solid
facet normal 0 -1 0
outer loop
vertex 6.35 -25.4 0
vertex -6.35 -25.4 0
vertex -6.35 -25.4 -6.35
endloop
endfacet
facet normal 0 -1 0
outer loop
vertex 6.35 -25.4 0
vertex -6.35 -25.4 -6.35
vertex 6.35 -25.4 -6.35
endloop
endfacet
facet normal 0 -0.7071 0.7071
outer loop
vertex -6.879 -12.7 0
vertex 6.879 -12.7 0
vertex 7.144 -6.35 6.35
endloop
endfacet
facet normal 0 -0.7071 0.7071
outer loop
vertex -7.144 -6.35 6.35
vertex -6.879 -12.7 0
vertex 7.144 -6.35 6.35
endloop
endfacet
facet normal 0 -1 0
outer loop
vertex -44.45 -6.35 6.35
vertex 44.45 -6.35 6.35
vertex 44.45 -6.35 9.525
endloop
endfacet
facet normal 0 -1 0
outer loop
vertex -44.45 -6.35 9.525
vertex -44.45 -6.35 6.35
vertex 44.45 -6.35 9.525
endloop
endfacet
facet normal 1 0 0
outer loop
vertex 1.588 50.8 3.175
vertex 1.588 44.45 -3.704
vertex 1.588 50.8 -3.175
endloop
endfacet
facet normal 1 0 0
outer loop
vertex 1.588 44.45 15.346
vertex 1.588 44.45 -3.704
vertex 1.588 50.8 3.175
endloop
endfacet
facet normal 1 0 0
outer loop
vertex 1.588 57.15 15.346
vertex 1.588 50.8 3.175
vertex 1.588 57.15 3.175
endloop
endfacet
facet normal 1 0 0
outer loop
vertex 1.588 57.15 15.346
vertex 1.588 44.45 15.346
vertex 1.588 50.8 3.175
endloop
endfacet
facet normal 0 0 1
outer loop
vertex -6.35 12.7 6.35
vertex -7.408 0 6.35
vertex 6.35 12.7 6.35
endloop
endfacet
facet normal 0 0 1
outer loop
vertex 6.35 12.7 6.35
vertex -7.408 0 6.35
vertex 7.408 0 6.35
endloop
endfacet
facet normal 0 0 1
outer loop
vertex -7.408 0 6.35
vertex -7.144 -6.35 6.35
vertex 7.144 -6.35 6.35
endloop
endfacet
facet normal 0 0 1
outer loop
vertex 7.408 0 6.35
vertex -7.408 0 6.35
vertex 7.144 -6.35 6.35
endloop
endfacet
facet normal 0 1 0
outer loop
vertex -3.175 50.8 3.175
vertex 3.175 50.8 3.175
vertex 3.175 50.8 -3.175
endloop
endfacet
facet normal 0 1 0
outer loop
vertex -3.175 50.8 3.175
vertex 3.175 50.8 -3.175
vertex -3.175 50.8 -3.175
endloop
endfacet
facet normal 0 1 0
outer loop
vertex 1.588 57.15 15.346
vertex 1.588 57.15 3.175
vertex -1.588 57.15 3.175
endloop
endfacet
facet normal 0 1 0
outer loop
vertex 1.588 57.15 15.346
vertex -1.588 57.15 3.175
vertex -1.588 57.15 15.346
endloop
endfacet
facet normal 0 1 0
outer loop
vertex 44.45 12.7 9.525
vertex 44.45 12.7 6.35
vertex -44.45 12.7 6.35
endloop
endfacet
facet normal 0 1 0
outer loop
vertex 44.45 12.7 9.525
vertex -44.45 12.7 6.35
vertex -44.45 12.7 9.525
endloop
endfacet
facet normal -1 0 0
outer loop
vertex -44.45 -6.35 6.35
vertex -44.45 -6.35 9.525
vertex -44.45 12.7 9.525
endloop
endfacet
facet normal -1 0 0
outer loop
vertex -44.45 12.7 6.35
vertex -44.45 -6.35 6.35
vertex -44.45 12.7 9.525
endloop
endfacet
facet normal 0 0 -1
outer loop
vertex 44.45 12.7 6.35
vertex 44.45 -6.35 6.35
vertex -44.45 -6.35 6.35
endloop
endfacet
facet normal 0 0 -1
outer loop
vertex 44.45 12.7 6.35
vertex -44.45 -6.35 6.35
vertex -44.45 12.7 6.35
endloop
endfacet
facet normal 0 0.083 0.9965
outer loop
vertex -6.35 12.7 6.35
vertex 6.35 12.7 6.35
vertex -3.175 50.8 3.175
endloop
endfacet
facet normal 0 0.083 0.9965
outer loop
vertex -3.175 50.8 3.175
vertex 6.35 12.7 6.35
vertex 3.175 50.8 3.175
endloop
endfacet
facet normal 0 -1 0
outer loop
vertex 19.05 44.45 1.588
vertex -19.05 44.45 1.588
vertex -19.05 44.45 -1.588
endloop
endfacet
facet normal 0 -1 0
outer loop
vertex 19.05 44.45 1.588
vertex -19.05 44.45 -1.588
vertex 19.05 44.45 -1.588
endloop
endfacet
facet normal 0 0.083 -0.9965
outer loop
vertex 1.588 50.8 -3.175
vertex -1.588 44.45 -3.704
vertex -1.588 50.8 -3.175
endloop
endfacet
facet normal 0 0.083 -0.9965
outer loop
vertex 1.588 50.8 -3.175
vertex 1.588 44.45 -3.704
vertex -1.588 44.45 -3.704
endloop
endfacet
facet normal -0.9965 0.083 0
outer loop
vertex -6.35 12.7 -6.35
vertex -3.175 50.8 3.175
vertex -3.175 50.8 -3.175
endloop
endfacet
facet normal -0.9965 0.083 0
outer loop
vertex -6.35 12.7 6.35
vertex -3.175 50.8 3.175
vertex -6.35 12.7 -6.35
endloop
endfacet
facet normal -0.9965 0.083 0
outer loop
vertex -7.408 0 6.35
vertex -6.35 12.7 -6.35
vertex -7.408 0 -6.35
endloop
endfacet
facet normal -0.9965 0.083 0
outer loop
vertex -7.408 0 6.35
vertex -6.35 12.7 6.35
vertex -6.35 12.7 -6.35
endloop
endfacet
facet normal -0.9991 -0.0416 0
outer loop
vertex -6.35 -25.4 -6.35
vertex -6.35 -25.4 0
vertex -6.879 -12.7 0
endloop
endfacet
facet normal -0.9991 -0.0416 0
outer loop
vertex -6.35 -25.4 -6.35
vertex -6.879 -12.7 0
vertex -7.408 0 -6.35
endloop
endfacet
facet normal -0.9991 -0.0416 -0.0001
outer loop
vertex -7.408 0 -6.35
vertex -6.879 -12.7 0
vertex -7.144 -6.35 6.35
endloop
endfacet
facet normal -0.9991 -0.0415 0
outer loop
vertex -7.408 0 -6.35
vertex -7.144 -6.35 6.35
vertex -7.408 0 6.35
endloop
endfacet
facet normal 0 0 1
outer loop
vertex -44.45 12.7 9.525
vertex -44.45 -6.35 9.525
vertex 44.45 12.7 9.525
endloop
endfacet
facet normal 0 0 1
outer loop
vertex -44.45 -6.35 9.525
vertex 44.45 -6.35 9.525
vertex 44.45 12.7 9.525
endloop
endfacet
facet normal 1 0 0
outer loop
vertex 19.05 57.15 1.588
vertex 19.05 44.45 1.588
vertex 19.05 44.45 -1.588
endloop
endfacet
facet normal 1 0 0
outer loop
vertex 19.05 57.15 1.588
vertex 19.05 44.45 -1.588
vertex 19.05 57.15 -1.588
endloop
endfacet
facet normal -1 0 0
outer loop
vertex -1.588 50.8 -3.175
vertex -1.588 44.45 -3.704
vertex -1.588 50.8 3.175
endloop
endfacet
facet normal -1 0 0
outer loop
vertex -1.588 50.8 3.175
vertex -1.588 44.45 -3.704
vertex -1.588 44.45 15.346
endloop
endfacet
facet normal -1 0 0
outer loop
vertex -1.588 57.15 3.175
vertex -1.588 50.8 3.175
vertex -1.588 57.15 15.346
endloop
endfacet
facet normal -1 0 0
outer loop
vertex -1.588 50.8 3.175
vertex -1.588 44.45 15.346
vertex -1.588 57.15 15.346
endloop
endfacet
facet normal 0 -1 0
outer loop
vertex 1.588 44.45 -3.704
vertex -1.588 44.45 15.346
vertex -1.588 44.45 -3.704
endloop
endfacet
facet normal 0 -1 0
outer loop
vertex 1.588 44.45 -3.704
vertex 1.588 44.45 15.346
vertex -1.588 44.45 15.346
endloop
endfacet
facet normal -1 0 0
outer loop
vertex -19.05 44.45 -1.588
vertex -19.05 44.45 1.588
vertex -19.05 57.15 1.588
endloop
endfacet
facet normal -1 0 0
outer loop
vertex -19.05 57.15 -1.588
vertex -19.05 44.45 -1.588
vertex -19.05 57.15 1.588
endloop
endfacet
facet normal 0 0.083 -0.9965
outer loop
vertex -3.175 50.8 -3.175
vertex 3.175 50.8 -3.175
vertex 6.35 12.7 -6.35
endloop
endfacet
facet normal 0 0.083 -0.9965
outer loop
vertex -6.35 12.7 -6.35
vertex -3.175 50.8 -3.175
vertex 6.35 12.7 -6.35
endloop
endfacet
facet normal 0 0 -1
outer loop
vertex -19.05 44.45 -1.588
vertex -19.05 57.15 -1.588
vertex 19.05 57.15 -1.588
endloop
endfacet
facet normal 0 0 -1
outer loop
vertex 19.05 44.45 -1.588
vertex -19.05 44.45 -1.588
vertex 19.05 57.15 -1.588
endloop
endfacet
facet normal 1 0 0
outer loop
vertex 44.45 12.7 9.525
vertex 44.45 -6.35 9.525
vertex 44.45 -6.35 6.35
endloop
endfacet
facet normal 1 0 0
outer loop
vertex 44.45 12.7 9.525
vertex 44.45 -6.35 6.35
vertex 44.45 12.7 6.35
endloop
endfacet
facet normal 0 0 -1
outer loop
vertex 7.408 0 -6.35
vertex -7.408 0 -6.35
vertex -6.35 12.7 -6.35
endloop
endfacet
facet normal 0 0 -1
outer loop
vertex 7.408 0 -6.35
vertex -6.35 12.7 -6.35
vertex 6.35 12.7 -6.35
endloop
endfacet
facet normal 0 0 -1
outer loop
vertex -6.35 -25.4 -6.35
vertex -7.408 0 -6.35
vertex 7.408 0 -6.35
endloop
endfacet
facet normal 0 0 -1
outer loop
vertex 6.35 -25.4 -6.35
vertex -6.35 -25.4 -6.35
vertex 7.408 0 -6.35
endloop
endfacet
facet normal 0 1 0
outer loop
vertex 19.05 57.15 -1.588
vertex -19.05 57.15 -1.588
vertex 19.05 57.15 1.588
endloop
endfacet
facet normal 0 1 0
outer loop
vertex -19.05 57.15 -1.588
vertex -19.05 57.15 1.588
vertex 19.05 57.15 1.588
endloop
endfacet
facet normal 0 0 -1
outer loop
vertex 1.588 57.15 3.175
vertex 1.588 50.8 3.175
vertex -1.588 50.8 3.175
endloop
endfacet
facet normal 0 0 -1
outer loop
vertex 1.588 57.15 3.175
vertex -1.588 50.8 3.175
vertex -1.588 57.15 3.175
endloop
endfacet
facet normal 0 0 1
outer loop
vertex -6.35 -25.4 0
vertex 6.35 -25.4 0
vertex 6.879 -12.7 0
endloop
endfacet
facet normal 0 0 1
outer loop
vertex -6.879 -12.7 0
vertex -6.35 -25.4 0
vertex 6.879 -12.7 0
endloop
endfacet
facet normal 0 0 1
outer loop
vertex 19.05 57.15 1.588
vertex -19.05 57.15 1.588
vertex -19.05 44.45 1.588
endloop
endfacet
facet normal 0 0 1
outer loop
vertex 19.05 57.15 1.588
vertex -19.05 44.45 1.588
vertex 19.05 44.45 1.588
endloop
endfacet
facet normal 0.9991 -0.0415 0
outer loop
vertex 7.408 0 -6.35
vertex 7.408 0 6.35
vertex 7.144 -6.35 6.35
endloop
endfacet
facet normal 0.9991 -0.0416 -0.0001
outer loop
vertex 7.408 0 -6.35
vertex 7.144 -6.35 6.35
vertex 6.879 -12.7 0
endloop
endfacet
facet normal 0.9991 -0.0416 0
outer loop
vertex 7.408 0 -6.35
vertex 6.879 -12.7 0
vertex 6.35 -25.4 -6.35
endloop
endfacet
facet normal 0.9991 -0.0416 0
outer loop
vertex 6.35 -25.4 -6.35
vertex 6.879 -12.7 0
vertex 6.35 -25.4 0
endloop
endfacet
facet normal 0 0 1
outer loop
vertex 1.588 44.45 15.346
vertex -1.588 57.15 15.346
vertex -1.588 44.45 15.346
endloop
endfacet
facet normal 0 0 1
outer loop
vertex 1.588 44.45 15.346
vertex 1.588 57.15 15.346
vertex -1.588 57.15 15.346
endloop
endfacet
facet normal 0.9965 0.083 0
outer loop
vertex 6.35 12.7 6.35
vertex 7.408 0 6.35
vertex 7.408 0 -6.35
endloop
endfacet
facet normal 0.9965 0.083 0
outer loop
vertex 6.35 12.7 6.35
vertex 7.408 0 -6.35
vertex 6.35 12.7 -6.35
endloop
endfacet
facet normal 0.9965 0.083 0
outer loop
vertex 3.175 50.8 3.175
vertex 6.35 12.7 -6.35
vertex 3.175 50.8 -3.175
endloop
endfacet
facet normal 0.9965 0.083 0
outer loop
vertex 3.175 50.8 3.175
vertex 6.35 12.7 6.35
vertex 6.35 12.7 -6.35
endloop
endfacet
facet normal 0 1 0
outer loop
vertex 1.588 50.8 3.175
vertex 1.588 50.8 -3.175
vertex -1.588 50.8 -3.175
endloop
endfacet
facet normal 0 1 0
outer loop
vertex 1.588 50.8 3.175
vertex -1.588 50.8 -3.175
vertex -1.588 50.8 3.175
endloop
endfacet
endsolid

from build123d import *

# Parameters (mm, degrees)
F0_W          = 19.05
F0_H          = 12.7
F1_DEPTH      = 25.4
F1_DEPTH_BACK = 50.8
F3_DEPTH      = 12.7
F5_DEPTH      = 12.7
F7_DEPTH      = 7.14475
F7_DEPTH_BACK = 7.14475
F8_W          = 19.0499999978
F8_H          = 3.175
F9_DEPTH      = 44.45
F10_W         = 38.1
F10_H         = 12.7
F11_DEPTH     = 1.5875
F13_DEPTH     = 1.5875


with BuildPart() as f1:
    # F0 (on Front) → F1 (new body, two sides)
    with BuildSketch(Plane.XZ) as f1_sk:
        Rectangle(F0_W, F0_H)
    extrude(amount=F1_DEPTH)
    extrude(f1_sk.sketch, amount=-F1_DEPTH_BACK)

    # F2 (on face) → F3 (intersect, through all)
    with BuildSketch(Plane.XY.offset(6.35)):
        Polygon((-3.175, 50.8), (-9.525, -25.4), (0, -25.4), (9.525, -25.4), (3.175, 50.8), (0, 50.8), align=None)
    extrude(amount=-F3_DEPTH, mode=Mode.INTERSECT)

    # F4 (on face) → F5 (cut, through all)
    with BuildSketch(Plane.XY.offset(6.35)):
        Polygon((-6.35, -25.4), (-7.4083333333, 0), (-9.525, -25.4), align=None)
        Polygon((7.4083333333, 0), (6.35, -25.4), (9.525, -25.4), align=None)
    extrude(amount=-F5_DEPTH, mode=Mode.SUBTRACT)

    # F6 (on Right) → F7 (cut, two sides)
    with BuildSketch(Plane.YZ) as f7_sk:
        Polygon((-12.7, 0), (-6.35, 6.35), (-25.4, 6.35), (-25.4, 0), align=None)
        Polygon((50.8, 6.35), (12.7, 6.35), (50.8, 3.175), align=None)
        Polygon((50.8, -3.175), (12.7, -6.35), (50.8, -6.35), align=None)
    extrude(amount=-F7_DEPTH, mode=Mode.SUBTRACT)
    extrude(f7_sk.sketch, amount=F7_DEPTH_BACK, mode=Mode.SUBTRACT)


with BuildPart() as f9:
    # F8 (on Right) → F9 (new body, symmetric)
    with BuildSketch(Plane.YZ):
        with Locations((3.1749999989, 7.9375)):
            Rectangle(F8_W, F8_H)
    extrude(amount=F9_DEPTH, both=True)


with BuildPart() as f11:
    # F10 (on Top) → F11 (new body, symmetric)
    with BuildSketch(Plane.XY):
        with Locations((-2e-10, 50.8)):
            Rectangle(F10_W, F10_H)
    extrude(amount=F11_DEPTH, both=True)


with BuildPart() as f13:
    # F12 (on Right) → F13 (new body, symmetric)
    with BuildSketch(Plane.YZ):
        Polygon((44.45, -3.7041666667), (50.8, -3.175), (50.8, 3.175), (57.15, 3.175), (57.15, 15.3458333333), (50.8, 15.3458333333), (44.45, 15.3458333333), align=None)
    extrude(amount=F13_DEPTH, both=True)


solid = Compound([f1.part, f9.part, f11.part, f13.part])
